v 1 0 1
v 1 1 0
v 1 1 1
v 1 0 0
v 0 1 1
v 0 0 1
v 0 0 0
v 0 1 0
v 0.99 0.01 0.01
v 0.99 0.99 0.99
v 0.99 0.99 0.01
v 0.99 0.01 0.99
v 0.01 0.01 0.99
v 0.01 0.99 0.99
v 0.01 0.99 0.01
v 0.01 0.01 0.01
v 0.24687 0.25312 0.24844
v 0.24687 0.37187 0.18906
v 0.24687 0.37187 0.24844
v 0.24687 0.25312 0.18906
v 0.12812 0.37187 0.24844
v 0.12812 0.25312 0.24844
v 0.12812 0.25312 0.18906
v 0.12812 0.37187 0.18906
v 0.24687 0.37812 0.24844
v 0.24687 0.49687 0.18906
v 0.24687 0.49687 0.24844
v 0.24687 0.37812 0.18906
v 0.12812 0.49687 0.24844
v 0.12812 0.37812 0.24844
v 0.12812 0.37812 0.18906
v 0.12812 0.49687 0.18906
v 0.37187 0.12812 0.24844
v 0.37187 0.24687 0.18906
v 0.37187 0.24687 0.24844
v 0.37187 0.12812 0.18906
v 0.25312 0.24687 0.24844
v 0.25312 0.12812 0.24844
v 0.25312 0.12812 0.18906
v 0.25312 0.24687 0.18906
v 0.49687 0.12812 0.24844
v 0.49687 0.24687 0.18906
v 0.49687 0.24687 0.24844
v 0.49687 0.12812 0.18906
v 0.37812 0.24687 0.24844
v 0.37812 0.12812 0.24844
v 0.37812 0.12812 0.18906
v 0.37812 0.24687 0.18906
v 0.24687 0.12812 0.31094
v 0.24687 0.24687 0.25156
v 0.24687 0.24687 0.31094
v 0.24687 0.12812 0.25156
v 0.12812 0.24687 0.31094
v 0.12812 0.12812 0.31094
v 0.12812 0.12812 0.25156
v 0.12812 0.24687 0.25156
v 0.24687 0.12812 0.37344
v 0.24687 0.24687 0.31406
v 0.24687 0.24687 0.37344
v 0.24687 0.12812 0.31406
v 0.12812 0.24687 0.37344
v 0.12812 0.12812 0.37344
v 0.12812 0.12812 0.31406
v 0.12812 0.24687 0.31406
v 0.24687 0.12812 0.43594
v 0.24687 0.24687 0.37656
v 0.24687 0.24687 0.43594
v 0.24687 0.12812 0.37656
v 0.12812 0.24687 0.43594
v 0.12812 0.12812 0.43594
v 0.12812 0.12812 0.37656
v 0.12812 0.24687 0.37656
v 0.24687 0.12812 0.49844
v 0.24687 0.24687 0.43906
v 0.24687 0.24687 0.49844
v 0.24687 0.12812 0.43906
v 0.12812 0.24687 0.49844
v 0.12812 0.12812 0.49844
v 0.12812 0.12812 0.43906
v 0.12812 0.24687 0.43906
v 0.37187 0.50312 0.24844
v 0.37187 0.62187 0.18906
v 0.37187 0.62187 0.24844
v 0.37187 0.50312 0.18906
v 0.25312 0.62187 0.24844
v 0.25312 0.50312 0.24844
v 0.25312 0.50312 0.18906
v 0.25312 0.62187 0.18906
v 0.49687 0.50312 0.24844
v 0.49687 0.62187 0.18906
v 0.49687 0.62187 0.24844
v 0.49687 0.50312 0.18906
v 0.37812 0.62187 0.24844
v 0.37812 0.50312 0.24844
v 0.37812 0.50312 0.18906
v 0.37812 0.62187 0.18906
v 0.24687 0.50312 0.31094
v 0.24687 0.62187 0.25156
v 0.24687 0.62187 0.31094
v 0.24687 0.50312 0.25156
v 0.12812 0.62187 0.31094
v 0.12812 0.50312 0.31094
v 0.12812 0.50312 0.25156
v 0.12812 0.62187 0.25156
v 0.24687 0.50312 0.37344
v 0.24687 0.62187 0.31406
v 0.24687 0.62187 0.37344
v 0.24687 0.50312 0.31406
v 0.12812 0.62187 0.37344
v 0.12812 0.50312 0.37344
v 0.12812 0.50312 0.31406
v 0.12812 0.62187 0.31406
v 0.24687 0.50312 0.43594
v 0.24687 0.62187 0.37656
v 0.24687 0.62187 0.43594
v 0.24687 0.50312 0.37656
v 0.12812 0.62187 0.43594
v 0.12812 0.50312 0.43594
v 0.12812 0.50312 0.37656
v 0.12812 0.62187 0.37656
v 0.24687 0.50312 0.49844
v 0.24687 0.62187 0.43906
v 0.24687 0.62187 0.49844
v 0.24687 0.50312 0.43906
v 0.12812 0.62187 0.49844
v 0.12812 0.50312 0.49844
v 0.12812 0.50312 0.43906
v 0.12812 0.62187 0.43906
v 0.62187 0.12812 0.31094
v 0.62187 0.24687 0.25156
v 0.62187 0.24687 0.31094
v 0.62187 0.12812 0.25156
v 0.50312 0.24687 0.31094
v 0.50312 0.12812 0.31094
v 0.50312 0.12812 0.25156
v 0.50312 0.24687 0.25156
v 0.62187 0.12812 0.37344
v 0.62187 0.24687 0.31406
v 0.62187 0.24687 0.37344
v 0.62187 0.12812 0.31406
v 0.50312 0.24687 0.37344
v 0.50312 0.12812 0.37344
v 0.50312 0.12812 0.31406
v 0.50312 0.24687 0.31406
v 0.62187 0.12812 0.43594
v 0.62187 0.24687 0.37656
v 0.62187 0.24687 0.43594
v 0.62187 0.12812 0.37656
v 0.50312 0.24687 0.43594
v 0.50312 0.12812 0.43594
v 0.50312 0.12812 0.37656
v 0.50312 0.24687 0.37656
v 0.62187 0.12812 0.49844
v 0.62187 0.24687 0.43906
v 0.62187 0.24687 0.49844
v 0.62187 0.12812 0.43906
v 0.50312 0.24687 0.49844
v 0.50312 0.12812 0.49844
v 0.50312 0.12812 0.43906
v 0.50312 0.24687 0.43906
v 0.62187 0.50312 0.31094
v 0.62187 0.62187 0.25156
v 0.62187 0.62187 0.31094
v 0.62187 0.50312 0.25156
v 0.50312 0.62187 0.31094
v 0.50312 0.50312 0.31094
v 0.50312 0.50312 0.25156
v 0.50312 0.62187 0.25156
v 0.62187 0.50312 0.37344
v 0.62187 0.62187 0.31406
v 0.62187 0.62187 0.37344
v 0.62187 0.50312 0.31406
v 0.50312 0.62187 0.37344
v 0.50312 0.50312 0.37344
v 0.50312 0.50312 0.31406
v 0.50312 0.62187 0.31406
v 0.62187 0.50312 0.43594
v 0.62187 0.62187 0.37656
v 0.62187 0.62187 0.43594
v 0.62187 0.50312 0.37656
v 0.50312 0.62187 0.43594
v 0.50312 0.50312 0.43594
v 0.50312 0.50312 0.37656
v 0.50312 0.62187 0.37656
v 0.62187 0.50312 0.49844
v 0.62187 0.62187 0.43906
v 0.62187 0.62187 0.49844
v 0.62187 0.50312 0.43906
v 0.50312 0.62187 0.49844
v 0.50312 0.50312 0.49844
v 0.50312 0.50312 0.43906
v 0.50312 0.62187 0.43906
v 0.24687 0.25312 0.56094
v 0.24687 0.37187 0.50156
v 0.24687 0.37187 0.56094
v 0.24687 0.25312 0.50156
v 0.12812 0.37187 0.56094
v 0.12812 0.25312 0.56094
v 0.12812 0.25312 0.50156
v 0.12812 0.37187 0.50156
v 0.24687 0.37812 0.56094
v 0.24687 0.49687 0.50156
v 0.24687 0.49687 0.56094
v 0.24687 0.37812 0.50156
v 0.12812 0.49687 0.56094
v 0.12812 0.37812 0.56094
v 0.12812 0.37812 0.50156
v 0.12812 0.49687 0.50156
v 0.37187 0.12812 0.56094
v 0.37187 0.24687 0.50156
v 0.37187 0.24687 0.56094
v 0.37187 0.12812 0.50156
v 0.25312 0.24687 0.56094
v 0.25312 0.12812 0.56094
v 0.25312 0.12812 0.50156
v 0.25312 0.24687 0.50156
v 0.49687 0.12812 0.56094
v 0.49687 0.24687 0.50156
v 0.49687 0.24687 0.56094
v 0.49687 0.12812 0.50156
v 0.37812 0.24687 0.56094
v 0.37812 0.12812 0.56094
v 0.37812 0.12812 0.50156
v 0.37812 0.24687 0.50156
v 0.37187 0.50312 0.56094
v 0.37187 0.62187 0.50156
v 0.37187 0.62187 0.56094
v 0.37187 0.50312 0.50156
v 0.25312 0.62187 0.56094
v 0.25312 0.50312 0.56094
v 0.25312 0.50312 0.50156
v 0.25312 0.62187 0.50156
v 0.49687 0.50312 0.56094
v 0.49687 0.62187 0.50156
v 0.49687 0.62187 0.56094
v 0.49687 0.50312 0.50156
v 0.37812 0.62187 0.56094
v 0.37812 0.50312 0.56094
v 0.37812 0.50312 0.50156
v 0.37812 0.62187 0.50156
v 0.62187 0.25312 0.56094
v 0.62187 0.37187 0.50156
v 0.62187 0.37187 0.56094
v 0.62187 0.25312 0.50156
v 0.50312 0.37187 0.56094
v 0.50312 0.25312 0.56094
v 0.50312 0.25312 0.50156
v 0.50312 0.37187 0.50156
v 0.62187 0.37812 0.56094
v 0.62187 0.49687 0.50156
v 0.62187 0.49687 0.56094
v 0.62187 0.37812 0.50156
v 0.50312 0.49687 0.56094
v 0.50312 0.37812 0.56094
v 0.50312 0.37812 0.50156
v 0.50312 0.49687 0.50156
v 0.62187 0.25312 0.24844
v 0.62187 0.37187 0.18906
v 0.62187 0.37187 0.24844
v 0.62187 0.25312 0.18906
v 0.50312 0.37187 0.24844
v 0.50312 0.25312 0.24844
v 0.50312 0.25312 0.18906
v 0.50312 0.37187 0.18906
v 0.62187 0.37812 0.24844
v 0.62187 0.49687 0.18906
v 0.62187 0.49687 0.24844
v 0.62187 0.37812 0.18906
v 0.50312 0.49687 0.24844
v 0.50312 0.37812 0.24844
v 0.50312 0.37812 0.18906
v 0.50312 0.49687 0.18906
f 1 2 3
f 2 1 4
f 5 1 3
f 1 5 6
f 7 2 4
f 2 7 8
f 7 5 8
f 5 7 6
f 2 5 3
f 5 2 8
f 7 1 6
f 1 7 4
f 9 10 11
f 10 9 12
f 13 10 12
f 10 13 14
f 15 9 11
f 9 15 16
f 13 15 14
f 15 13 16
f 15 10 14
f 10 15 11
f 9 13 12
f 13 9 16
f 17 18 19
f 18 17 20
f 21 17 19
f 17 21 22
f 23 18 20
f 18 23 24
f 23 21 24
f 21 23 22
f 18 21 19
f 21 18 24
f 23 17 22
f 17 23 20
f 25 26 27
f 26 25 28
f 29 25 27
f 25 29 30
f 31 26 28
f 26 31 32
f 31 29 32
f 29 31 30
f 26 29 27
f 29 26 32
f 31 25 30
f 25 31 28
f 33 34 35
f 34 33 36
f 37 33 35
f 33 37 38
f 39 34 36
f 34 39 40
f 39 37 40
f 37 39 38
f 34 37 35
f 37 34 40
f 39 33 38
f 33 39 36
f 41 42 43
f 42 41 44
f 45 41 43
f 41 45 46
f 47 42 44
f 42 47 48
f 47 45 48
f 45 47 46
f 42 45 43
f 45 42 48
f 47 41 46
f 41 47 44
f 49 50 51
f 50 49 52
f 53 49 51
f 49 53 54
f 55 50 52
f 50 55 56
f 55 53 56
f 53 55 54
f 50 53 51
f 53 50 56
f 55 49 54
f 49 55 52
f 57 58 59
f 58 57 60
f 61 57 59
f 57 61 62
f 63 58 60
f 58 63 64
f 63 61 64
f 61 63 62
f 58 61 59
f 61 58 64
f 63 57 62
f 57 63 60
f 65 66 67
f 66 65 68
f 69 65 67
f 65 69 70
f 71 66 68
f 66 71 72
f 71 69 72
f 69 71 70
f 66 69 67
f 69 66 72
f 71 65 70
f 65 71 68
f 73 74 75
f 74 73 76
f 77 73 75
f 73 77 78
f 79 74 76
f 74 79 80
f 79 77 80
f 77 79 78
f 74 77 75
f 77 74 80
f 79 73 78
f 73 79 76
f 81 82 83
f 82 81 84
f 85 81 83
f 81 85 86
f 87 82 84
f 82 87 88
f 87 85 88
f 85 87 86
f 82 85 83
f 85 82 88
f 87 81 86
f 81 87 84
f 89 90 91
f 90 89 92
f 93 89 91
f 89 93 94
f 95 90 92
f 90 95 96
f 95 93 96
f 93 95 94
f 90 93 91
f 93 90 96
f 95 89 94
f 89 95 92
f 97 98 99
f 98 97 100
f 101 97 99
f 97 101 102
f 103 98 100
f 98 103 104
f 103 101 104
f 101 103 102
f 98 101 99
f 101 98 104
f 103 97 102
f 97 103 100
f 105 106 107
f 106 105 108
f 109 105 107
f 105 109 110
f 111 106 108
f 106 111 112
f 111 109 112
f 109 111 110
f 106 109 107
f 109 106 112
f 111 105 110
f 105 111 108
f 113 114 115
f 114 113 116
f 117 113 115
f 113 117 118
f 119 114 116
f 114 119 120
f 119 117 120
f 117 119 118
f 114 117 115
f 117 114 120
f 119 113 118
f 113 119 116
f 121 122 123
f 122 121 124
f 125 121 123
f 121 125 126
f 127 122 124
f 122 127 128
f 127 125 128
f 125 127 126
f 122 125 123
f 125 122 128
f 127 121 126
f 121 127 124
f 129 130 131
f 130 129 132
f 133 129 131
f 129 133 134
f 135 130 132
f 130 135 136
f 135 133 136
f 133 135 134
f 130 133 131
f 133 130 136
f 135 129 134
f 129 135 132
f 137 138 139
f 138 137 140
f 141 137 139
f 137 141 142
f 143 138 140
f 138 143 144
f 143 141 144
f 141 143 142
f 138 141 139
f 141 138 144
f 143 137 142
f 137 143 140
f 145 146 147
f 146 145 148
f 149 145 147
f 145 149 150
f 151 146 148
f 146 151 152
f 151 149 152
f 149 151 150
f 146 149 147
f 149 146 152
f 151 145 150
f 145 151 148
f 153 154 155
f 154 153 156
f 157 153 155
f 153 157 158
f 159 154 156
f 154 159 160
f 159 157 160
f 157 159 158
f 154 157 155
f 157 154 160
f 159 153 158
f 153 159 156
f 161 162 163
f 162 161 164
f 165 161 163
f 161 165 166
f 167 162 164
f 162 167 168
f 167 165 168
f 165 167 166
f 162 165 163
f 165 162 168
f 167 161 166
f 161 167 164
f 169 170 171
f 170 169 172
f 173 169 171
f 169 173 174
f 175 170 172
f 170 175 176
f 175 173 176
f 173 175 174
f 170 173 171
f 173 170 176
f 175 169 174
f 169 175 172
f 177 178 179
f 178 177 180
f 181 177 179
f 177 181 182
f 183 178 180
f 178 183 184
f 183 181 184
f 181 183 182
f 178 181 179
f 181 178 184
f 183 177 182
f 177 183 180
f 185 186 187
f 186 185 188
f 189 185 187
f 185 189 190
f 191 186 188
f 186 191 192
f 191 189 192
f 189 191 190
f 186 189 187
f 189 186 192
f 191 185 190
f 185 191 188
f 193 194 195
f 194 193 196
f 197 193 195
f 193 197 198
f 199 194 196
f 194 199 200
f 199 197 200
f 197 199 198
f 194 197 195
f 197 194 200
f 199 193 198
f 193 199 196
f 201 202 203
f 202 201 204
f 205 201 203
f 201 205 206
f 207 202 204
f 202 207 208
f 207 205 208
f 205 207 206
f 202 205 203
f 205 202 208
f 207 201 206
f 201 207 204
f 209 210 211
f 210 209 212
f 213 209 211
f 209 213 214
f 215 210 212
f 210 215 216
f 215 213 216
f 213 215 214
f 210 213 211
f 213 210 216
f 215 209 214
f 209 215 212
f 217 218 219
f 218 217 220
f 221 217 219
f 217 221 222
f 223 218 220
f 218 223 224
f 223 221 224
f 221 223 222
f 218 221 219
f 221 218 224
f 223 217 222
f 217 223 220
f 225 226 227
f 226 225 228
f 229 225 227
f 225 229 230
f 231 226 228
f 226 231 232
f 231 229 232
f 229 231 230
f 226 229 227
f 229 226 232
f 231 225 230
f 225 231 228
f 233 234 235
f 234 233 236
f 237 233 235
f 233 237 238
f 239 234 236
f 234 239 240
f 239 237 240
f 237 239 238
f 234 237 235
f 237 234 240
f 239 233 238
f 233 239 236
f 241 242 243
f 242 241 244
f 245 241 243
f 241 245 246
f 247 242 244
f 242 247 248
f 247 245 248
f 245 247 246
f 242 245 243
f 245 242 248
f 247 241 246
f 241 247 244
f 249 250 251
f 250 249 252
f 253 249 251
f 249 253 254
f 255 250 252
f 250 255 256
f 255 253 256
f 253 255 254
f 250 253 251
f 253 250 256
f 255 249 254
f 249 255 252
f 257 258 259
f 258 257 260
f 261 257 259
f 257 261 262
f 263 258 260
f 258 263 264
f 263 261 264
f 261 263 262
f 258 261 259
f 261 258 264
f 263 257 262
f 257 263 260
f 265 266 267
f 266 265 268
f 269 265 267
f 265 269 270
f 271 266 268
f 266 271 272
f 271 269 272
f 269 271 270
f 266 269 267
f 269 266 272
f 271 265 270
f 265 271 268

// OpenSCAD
translate([0.1875, 0.3125, 0.21875]) color([0.3394448706328078, 0.45855440081433096, 0.0007502935671159783]) cube([0.11875, 0.11875, 0.059375], center=true);
translate([0.1875, 0.4375, 0.21875]) color([0.8084995756647368, 0.0331322283588068, 0.9954935019736515]) cube([0.11875, 0.11875, 0.059375], center=true);
translate([0.3125, 0.1875, 0.21875]) color([0.32750610520168044, 0.511786711221762, 0.09639677946248049]) cube([0.11875, 0.11875, 0.059375], center=true);
translate([0.4375, 0.1875, 0.21875]) color([0.46647601470953737, 0.043404226035316795, 0.8089506697449751]) cube([0.11875, 0.11875, 0.059375], center=true);
translate([0.1875, 0.1875, 0.28125]) color([0.9065579579370614, 0.48874197586323487, 0.4689182776921319]) cube([0.11875, 0.11875, 0.059375], center=true);
translate([0.1875, 0.1875, 0.34375]) color([0.9999833648369341, 0.42392948264922625, 0.11056216143511133]) cube([0.11875, 0.11875, 0.059375], center=true);
translate([0.1875, 0.1875, 0.40625]) color([0.5007484231317689, 0.23725843071495933, 0.7435751616565288]) cube([0.11875, 0.11875, 0.059375], center=true);
translate([0.1875, 0.1875, 0.46875]) color([0.030326511183225713, 0.9534383365251057, 0.44454391677925087]) cube([0.11875, 0.11875, 0.059375], center=true);
translate([0.3125, 0.5625, 0.21875]) color([0.4017260225039573, 0.6984802625757133, 0.14751428227125585]) cube([0.11875, 0.11875, 0.059375], center=true);
translate([0.4375, 0.5625, 0.21875]) color([0.592053202978914, 0.7602792343344718, 0.23214841748979886]) cube([0.11875, 0.11875, 0.059375], center=true);
translate([0.1875, 0.5625, 0.28125]) color([0.2215781656479593, 0.24536616409996503, 0.7021925659500807]) cube([0.11875, 0.11875, 0.059375], center=true);
translate([0.1875, 0.5625, 0.34375]) color([0.5457605096294114, 0.54011508338913, 0.5459453680001618]) cube([0.11875, 0.11875, 0.059375], center=true);
translate([0.1875, 0.5625, 0.40625]) color([0.21439919344985514, 0.4167057873106884, 0.6193494045718565]) cube([0.11875, 0.11875, 0.059375], center=true);
translate([0.1875, 0.5625, 0.46875]) color([0.45760594266221877, 0.8933837090972113, 0.8109172526149769]) cube([0.11875, 0.11875, 0.059375], center=true);
translate([0.5625, 0.1875, 0.28125]) color([0.14833972802097417, 0.6068004170768148, 0.5080529466064481]) cube([0.11875, 0.11875, 0.059375], center=true);
translate([0.5625, 0.1875, 0.34375]) color([0.9906187087676633, 0.11352393843166497, 0.6883720652754897]) cube([0.11875, 0.11875, 0.059375], center=true);
translate([0.5625, 0.1875, 0.40625]) color([0.5952346609945763, 0.6540807806784664, 0.3474259839548979]) cube([0.11875, 0.11875, 0.059375], center=true);
translate([0.5625, 0.1875, 0.46875]) color([0.9928586924360654, 0.247192741454632, 0.70975753974483]) cube([0.11875, 0.11875, 0.059375], center=true);
translate([0.5625, 0.5625, 0.28125]) color([0.13794757021236903, 0.4611444179186315, 0.04899626755467579]) cube([0.11875, 0.11875, 0.059375], center=true);
translate([0.5625, 0.5625, 0.34375]) color([0.1977229983916683, 0.036370797334404625, 0.13840798504488894]) cube([0.11875, 0.11875, 0.059375], center=true);
translate([0.5625, 0.5625, 0.40625]) color([0.695134065044521, 0.2654011745990712, 0.4635417367699751]) cube([0.11875, 0.11875, 0.059375], center=true);
translate([0.5625, 0.5625, 0.46875]) color([0.14067843926211876, 0.3233092624720053, 0.6766209265725885]) cube([0.11875, 0.11875, 0.059375], center=true);
translate([0.1875, 0.3125, 0.53125]) color([0.5598941248919586, 0.2674263193966361, 0.7715367321750608]) cube([0.11875, 0.11875, 0.059375], center=true);
translate([0.1875, 0.4375, 0.53125]) color([0.7775867750177572, 0.3358457771023752, 0.7984986383285079]) cube([0.11875, 0.11875, 0.059375], center=true);
translate([0.3125, 0.1875, 0.53125]) color([0.3608344962449672, 0.130636609727118, 0.1470050456404287]) cube([0.11875, 0.11875, 0.059375], center=true);
translate([0.4375, 0.1875, 0.53125]) color([0.5817121628313788, 0.46286602772829477, 0.8824527290015699]) cube([0.11875, 0.11875, 0.059375], center=true);
translate([0.3125, 0.5625, 0.53125]) color([0.1201105517589024, 0.1938197880719691, 0.4695931850983104]) cube([0.11875, 0.11875, 0.059375], center=true);
translate([0.4375, 0.5625, 0.53125]) color([0.14078313852784263, 0.6451769219884874, 0.9811903017448982]) cube([0.11875, 0.11875, 0.059375], center=true);
translate([0.5625, 0.3125, 0.53125]) color([0.8740229692652243, 0.6541461711493592, 0.21289315855754942]) cube([0.11875, 0.11875, 0.059375], center=true);
translate([0.5625, 0.4375, 0.53125]) color([0.9328418457966335, 0.42345059226773774, 0.5012376899041451]) cube([0.11875, 0.11875, 0.059375], center=true);
translate([0.5625, 0.3125, 0.21875]) color([0.5811541702347708, 0.2791891573101454, 0.2092311813057095]) cube([0.11875, 0.11875, 0.059375], center=true);
translate([0.5625, 0.4375, 0.21875]) color([0.9628933046967749, 0.6198760626942967, 0.5999578261672418]) cube([0.11875, 0.11875, 0.059375], center=true);
color([0.3,0.3,0.3,0.3]) difference() { cube([1,1,1]); translate([0.01,0.01,0.01]) cube([0.98,0.98,0.98]); }
